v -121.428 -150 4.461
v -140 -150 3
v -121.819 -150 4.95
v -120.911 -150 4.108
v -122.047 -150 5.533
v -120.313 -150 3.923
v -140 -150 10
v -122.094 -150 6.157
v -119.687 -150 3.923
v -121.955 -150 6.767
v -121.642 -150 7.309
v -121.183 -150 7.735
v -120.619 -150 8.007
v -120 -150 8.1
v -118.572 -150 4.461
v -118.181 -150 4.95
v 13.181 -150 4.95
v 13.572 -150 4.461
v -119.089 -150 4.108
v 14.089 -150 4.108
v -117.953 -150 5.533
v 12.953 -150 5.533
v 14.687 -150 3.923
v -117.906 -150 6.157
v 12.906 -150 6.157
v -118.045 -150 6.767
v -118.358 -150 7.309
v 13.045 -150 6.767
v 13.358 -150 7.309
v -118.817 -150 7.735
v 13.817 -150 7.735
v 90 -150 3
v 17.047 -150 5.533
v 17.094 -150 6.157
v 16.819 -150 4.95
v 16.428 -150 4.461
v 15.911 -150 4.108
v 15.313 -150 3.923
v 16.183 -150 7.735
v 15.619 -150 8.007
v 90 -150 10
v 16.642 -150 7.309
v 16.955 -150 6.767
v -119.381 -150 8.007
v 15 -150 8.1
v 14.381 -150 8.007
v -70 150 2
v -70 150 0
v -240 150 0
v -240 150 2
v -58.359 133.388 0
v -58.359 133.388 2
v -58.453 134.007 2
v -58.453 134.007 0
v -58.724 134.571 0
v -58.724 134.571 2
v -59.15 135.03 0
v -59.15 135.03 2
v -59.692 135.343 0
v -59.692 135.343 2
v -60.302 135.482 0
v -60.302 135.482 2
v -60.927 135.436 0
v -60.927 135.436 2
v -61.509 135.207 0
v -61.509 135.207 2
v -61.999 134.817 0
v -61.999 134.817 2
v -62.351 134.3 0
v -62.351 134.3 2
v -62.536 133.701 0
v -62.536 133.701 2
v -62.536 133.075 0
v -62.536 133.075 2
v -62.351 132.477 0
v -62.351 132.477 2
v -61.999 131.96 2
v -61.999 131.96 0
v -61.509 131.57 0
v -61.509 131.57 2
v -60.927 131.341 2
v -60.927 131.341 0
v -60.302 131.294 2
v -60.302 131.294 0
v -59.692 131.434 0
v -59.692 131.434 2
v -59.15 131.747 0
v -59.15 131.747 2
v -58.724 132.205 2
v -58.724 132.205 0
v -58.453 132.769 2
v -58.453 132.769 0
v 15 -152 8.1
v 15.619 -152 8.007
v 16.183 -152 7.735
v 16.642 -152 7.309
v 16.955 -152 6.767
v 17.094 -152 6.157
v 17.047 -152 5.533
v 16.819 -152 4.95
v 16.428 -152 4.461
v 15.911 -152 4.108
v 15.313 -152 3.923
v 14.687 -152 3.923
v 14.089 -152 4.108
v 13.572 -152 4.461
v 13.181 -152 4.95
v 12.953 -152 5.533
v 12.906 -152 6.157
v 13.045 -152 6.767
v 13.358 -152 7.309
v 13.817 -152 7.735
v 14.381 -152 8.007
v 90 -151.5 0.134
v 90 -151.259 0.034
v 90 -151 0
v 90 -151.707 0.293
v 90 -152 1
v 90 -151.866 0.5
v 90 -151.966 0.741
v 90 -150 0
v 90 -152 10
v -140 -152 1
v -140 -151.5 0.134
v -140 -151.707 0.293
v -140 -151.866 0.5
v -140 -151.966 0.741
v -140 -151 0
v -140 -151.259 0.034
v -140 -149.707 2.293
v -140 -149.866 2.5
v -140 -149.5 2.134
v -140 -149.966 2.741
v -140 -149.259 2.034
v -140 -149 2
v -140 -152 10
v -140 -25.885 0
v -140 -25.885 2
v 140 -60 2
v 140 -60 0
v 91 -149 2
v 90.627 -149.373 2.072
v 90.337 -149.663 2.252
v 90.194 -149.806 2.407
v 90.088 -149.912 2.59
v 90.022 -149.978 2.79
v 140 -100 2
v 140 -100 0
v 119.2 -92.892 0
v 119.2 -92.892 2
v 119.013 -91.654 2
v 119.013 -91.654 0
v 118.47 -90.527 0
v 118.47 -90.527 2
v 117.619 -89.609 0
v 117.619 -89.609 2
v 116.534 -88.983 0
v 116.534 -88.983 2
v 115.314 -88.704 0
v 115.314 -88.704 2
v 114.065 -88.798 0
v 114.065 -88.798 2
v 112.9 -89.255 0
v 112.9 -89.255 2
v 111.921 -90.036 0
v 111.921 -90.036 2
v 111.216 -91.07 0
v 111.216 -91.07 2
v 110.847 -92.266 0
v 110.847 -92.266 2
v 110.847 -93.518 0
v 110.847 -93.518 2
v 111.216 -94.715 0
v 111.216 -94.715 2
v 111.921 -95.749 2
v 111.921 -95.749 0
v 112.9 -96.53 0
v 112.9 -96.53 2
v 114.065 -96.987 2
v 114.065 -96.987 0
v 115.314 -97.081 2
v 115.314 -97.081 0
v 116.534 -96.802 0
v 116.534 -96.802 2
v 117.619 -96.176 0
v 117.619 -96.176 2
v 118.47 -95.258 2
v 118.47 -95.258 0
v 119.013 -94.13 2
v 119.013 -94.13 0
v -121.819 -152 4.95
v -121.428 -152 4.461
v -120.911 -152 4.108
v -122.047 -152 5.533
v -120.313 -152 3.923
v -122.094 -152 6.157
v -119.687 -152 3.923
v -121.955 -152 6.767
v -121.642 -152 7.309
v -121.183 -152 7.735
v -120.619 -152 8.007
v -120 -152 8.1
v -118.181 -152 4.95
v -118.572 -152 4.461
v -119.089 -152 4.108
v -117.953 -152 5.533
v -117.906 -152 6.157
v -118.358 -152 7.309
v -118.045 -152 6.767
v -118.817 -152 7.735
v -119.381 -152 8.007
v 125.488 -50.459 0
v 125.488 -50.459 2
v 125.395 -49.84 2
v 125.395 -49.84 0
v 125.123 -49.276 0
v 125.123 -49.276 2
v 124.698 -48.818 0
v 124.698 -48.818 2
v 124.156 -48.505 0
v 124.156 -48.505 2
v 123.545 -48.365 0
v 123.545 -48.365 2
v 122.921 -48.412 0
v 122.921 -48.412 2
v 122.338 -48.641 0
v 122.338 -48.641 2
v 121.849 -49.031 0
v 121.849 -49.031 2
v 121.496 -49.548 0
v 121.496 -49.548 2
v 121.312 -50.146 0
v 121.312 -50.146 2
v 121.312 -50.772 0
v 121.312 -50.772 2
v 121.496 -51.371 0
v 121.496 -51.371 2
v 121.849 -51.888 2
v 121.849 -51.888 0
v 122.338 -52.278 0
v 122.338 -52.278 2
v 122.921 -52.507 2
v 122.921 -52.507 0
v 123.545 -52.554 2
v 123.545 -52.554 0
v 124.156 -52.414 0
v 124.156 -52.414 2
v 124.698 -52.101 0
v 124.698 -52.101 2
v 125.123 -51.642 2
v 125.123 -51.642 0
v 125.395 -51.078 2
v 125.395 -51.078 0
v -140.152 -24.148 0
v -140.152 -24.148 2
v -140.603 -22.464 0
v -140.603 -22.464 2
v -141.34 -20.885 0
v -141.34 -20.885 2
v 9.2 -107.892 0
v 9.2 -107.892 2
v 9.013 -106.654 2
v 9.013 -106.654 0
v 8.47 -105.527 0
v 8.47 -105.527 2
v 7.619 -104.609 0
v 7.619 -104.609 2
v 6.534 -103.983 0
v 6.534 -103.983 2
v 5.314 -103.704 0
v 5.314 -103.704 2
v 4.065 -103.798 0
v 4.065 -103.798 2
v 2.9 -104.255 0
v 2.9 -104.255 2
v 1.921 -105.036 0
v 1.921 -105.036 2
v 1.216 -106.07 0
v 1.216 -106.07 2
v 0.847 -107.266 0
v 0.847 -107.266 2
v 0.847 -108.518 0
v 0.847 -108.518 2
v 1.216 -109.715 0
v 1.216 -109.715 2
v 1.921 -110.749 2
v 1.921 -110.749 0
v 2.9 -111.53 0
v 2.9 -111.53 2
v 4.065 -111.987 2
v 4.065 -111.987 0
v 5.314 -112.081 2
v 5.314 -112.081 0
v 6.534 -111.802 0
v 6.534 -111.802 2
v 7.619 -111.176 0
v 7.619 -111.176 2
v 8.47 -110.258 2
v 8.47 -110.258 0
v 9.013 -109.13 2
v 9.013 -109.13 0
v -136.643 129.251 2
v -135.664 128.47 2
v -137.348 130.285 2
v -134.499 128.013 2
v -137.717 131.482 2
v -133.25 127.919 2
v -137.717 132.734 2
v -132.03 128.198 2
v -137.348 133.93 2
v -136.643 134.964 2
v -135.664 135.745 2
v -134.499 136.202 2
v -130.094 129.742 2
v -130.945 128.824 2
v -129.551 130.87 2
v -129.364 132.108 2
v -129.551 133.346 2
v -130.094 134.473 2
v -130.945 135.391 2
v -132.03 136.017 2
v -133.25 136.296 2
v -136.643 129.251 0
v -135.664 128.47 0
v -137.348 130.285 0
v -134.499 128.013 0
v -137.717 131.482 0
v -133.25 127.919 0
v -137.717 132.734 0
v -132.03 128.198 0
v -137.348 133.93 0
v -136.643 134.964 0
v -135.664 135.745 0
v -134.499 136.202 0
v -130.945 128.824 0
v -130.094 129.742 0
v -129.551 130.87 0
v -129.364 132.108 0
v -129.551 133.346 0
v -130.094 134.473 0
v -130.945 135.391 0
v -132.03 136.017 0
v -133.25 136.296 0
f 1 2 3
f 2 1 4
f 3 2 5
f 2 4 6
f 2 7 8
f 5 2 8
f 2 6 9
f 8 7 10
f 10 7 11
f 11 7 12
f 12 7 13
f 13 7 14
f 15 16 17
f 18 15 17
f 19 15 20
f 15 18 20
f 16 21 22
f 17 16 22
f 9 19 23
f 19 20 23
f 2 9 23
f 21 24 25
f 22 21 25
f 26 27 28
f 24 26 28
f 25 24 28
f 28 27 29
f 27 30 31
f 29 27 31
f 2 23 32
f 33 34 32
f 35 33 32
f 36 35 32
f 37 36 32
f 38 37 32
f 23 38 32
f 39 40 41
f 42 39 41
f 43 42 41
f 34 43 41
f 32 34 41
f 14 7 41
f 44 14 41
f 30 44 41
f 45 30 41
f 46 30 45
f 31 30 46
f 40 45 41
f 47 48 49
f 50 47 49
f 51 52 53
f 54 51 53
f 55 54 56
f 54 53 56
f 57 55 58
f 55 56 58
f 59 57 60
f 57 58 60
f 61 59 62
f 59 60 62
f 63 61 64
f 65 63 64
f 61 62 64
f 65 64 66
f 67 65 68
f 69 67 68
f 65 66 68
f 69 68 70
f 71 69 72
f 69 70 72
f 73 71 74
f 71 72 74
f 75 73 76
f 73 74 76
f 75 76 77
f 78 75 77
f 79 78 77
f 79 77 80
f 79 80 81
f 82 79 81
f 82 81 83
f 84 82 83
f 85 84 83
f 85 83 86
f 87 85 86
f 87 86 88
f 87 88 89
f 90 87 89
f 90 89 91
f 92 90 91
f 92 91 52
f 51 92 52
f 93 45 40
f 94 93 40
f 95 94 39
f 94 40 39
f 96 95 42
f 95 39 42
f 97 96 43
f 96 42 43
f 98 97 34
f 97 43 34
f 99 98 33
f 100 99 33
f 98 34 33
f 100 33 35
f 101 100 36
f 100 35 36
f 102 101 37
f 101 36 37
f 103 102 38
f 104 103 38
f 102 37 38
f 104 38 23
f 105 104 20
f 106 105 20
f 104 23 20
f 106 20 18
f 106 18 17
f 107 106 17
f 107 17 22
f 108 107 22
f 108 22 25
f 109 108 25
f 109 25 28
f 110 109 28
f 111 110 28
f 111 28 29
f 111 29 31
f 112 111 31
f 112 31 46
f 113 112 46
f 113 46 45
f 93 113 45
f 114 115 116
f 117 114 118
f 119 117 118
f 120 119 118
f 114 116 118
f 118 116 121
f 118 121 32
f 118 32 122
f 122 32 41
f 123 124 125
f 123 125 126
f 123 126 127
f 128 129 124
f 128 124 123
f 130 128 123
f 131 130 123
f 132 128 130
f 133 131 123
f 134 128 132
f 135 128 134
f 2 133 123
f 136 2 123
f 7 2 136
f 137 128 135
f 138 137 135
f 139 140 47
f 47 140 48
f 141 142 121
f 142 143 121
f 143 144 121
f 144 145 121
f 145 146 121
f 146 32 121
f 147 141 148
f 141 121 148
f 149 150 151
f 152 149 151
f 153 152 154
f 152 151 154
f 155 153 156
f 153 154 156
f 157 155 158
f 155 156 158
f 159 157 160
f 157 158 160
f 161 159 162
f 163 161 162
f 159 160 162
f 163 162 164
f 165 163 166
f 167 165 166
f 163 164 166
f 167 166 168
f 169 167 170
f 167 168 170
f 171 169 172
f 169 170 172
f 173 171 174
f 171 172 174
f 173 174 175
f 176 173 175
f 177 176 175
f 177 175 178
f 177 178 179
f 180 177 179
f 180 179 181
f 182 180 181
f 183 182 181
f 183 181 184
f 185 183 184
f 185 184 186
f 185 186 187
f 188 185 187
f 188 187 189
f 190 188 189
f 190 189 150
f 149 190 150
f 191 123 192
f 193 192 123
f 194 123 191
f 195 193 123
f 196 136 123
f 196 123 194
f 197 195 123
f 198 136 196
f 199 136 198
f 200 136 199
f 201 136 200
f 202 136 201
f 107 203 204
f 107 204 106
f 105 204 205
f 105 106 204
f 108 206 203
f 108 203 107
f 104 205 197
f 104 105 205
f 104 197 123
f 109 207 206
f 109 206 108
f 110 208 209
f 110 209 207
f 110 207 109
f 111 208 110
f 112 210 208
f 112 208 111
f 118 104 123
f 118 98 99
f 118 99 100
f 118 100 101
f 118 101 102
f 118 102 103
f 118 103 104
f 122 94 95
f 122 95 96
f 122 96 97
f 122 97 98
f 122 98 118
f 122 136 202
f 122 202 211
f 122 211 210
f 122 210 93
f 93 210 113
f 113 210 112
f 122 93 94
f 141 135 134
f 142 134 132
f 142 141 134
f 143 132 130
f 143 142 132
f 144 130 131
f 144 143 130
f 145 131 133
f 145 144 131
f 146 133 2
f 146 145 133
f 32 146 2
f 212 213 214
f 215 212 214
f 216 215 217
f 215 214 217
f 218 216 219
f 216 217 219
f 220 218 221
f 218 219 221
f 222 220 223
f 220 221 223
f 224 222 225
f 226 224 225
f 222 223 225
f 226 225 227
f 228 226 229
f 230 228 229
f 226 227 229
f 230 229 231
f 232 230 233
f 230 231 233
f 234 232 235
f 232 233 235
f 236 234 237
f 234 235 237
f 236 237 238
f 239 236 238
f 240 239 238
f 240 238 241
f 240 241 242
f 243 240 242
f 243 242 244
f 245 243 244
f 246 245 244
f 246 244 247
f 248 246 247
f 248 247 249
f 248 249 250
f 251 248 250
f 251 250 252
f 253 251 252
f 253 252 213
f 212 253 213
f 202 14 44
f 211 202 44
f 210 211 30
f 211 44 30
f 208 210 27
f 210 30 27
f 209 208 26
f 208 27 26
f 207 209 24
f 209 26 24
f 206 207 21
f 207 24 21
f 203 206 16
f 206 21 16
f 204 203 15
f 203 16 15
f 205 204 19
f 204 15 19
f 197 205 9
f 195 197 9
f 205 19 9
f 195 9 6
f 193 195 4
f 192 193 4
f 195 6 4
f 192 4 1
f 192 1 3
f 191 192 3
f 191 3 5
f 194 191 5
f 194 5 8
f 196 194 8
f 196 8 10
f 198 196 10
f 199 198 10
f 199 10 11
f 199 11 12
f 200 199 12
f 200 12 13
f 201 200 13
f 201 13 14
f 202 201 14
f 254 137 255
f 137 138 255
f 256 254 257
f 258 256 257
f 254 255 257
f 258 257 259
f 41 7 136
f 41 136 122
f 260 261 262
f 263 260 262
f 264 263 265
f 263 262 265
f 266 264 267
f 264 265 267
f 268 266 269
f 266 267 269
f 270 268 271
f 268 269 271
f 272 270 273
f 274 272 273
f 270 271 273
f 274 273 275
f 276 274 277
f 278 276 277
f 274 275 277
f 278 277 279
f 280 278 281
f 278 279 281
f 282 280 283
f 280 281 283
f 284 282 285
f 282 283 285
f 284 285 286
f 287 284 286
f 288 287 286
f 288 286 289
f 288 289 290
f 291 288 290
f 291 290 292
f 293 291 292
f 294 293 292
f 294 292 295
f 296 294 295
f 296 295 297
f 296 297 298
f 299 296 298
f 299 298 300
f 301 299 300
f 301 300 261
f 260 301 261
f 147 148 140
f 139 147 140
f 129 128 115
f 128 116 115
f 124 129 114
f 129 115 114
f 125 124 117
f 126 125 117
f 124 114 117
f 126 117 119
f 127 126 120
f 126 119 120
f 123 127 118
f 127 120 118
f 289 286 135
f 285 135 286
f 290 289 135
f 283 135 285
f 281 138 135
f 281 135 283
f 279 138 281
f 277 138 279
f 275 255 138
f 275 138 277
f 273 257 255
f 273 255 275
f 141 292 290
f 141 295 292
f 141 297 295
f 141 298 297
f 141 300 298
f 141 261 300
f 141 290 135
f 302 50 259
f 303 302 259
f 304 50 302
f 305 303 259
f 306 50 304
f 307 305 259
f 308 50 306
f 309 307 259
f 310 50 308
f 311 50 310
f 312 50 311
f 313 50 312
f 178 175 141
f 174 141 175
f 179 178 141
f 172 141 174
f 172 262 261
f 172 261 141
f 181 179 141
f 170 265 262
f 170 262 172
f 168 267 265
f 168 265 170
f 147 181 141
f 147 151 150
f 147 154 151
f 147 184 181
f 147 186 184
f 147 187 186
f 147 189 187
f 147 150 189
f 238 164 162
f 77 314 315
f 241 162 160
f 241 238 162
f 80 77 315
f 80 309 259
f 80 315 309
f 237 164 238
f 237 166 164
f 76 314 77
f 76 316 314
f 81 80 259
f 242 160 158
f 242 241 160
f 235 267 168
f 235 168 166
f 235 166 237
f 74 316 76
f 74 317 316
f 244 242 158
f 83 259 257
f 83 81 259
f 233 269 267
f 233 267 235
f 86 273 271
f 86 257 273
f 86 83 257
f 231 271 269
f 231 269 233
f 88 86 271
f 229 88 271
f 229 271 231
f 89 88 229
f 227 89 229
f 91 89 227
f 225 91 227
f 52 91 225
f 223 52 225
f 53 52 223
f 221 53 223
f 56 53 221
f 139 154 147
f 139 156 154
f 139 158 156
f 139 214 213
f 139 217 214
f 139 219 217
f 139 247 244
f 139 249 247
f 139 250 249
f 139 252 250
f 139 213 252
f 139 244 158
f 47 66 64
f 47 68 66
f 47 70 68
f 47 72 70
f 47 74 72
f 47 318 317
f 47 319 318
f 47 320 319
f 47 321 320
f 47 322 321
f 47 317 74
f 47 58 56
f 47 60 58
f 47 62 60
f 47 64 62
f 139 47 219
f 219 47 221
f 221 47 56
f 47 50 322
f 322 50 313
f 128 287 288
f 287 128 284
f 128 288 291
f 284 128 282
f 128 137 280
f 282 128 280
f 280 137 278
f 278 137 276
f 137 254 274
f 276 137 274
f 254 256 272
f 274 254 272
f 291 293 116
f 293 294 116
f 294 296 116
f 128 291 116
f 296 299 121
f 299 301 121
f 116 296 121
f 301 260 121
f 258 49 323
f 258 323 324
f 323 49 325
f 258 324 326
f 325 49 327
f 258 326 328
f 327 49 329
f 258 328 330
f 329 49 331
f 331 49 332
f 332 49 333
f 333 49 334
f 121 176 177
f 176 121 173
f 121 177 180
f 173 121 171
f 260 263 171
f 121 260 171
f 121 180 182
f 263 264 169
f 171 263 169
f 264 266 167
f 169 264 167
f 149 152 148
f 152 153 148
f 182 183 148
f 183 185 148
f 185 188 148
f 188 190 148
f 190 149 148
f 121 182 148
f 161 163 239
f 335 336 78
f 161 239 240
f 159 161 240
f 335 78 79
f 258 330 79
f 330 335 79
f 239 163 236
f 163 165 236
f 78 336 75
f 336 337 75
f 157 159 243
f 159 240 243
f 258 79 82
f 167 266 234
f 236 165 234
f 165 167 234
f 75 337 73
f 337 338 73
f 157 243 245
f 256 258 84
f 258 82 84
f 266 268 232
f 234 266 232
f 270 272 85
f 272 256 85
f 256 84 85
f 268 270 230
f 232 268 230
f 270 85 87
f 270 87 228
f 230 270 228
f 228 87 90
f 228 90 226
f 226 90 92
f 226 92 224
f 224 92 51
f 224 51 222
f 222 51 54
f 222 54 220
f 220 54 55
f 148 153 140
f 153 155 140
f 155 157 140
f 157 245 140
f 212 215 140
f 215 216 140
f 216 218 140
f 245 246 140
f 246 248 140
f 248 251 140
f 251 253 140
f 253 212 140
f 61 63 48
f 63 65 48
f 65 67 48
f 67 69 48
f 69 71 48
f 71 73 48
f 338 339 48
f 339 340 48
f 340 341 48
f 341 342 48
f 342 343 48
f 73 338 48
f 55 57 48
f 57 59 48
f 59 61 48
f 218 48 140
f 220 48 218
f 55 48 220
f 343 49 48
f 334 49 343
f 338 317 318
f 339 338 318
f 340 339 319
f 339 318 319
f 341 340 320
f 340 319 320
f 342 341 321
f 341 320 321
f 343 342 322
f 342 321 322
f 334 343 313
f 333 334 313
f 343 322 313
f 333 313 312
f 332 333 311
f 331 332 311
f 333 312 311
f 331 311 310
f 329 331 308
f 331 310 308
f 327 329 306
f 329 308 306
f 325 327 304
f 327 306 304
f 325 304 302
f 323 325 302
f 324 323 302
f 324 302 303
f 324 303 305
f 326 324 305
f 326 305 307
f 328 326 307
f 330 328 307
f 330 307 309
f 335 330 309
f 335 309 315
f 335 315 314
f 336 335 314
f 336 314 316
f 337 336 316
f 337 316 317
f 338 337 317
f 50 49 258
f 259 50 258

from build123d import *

# Parameters (mm, degrees)
BOSS_EXTRU_1_DEPTH      = 2
ESQUISSE2_W             = 230
ESQUISSE2_H             = 10
BOSS_EXTRU_2_DEPTH      = 2
CONG_1_R                = 1
ESQUISSE3_R             = 4.2
ENL_V_MAT_EXTRU_1_DEPTH = 285.197114693
ESQUISSE5_R             = 2.1
ENL_V_MAT_EXTRU_2_DEPTH = 385.317577012
ESQUISSE6_R             = 2.1
ENL_V_MAT_EXTRU_3_DEPTH = 285.197114693
CONG_2_R                = 10


with BuildPart() as part:
    # Esquisse1 → Boss.-Extru.1 (new body)
    with BuildSketch(Plane.XY):
        Polygon((140, -60), (-70, 150), (-140, 150), (-240, 150), (-140, -23.205080757), (-140, -150), (90, -150), (140, -100), align=None)
    extrude(amount=BOSS_EXTRU_1_DEPTH)

    # Esquisse2 → Boss.-Extru.2 (add)
    with BuildSketch(Plane.XZ.offset(150)):
        with Locations((-25, 5)):
            Rectangle(ESQUISSE2_W, ESQUISSE2_H)
    extrude(amount=BOSS_EXTRU_2_DEPTH)

    # Congé1
    cong_1_edges = [part.edges().sort_by_distance(p)[0] for p in [
        (-25, -152, 0),
        (-25, -150, 2),
    ]]
    fillet(cong_1_edges, radius=CONG_1_R)

    # Esquisse3 → Enlèv. mat.-Extru.1 (cut, through all)
    with BuildSketch(Plane.XY.offset(2)):
        with Locations((-133.564064606, 132.10753113)):
            Circle(ESQUISSE3_R)
        with Locations((5, -107.89246887)):
            Circle(ESQUISSE3_R)
        with Locations((115, -92.89246887)):
            Circle(ESQUISSE3_R)
    extrude(amount=-ENL_V_MAT_EXTRU_1_DEPTH, mode=Mode.SUBTRACT)

    # Esquisse5 → Enlèv. mat.-Extru.2 (cut, through all)
    with BuildSketch(Plane(origin=(0, -150, 0), x_dir=(1, 0, 0), z_dir=(0, 1, 0))):
        with Locations(Location((15, -6, 0), (0, 0, 270))):
            Circle(ESQUISSE5_R)
        with Locations(Location((-120, -6, 0), (0, 0, 270))):
            Circle(ESQUISSE5_R)
    extrude(amount=-ENL_V_MAT_EXTRU_2_DEPTH, mode=Mode.SUBTRACT)

    # Esquisse6 → Enlèv. mat.-Extru.3 (cut, through all)
    with BuildSketch(Plane.XY.offset(2)):
        with Locations((123.388347648, -50.45941546)):
            Circle(ESQUISSE6_R)
        with Locations((-60.45941546, 133.388347648)):
            Circle(ESQUISSE6_R)
    extrude(amount=-ENL_V_MAT_EXTRU_3_DEPTH, mode=Mode.SUBTRACT)

    # Congé2
    cong_2_edges = [part.edges().sort_by_distance(p)[0] for p in [
        (-140, -23.205080757, 1),
    ]]
    fillet(cong_2_edges, radius=CONG_2_R)


solid = part.part
